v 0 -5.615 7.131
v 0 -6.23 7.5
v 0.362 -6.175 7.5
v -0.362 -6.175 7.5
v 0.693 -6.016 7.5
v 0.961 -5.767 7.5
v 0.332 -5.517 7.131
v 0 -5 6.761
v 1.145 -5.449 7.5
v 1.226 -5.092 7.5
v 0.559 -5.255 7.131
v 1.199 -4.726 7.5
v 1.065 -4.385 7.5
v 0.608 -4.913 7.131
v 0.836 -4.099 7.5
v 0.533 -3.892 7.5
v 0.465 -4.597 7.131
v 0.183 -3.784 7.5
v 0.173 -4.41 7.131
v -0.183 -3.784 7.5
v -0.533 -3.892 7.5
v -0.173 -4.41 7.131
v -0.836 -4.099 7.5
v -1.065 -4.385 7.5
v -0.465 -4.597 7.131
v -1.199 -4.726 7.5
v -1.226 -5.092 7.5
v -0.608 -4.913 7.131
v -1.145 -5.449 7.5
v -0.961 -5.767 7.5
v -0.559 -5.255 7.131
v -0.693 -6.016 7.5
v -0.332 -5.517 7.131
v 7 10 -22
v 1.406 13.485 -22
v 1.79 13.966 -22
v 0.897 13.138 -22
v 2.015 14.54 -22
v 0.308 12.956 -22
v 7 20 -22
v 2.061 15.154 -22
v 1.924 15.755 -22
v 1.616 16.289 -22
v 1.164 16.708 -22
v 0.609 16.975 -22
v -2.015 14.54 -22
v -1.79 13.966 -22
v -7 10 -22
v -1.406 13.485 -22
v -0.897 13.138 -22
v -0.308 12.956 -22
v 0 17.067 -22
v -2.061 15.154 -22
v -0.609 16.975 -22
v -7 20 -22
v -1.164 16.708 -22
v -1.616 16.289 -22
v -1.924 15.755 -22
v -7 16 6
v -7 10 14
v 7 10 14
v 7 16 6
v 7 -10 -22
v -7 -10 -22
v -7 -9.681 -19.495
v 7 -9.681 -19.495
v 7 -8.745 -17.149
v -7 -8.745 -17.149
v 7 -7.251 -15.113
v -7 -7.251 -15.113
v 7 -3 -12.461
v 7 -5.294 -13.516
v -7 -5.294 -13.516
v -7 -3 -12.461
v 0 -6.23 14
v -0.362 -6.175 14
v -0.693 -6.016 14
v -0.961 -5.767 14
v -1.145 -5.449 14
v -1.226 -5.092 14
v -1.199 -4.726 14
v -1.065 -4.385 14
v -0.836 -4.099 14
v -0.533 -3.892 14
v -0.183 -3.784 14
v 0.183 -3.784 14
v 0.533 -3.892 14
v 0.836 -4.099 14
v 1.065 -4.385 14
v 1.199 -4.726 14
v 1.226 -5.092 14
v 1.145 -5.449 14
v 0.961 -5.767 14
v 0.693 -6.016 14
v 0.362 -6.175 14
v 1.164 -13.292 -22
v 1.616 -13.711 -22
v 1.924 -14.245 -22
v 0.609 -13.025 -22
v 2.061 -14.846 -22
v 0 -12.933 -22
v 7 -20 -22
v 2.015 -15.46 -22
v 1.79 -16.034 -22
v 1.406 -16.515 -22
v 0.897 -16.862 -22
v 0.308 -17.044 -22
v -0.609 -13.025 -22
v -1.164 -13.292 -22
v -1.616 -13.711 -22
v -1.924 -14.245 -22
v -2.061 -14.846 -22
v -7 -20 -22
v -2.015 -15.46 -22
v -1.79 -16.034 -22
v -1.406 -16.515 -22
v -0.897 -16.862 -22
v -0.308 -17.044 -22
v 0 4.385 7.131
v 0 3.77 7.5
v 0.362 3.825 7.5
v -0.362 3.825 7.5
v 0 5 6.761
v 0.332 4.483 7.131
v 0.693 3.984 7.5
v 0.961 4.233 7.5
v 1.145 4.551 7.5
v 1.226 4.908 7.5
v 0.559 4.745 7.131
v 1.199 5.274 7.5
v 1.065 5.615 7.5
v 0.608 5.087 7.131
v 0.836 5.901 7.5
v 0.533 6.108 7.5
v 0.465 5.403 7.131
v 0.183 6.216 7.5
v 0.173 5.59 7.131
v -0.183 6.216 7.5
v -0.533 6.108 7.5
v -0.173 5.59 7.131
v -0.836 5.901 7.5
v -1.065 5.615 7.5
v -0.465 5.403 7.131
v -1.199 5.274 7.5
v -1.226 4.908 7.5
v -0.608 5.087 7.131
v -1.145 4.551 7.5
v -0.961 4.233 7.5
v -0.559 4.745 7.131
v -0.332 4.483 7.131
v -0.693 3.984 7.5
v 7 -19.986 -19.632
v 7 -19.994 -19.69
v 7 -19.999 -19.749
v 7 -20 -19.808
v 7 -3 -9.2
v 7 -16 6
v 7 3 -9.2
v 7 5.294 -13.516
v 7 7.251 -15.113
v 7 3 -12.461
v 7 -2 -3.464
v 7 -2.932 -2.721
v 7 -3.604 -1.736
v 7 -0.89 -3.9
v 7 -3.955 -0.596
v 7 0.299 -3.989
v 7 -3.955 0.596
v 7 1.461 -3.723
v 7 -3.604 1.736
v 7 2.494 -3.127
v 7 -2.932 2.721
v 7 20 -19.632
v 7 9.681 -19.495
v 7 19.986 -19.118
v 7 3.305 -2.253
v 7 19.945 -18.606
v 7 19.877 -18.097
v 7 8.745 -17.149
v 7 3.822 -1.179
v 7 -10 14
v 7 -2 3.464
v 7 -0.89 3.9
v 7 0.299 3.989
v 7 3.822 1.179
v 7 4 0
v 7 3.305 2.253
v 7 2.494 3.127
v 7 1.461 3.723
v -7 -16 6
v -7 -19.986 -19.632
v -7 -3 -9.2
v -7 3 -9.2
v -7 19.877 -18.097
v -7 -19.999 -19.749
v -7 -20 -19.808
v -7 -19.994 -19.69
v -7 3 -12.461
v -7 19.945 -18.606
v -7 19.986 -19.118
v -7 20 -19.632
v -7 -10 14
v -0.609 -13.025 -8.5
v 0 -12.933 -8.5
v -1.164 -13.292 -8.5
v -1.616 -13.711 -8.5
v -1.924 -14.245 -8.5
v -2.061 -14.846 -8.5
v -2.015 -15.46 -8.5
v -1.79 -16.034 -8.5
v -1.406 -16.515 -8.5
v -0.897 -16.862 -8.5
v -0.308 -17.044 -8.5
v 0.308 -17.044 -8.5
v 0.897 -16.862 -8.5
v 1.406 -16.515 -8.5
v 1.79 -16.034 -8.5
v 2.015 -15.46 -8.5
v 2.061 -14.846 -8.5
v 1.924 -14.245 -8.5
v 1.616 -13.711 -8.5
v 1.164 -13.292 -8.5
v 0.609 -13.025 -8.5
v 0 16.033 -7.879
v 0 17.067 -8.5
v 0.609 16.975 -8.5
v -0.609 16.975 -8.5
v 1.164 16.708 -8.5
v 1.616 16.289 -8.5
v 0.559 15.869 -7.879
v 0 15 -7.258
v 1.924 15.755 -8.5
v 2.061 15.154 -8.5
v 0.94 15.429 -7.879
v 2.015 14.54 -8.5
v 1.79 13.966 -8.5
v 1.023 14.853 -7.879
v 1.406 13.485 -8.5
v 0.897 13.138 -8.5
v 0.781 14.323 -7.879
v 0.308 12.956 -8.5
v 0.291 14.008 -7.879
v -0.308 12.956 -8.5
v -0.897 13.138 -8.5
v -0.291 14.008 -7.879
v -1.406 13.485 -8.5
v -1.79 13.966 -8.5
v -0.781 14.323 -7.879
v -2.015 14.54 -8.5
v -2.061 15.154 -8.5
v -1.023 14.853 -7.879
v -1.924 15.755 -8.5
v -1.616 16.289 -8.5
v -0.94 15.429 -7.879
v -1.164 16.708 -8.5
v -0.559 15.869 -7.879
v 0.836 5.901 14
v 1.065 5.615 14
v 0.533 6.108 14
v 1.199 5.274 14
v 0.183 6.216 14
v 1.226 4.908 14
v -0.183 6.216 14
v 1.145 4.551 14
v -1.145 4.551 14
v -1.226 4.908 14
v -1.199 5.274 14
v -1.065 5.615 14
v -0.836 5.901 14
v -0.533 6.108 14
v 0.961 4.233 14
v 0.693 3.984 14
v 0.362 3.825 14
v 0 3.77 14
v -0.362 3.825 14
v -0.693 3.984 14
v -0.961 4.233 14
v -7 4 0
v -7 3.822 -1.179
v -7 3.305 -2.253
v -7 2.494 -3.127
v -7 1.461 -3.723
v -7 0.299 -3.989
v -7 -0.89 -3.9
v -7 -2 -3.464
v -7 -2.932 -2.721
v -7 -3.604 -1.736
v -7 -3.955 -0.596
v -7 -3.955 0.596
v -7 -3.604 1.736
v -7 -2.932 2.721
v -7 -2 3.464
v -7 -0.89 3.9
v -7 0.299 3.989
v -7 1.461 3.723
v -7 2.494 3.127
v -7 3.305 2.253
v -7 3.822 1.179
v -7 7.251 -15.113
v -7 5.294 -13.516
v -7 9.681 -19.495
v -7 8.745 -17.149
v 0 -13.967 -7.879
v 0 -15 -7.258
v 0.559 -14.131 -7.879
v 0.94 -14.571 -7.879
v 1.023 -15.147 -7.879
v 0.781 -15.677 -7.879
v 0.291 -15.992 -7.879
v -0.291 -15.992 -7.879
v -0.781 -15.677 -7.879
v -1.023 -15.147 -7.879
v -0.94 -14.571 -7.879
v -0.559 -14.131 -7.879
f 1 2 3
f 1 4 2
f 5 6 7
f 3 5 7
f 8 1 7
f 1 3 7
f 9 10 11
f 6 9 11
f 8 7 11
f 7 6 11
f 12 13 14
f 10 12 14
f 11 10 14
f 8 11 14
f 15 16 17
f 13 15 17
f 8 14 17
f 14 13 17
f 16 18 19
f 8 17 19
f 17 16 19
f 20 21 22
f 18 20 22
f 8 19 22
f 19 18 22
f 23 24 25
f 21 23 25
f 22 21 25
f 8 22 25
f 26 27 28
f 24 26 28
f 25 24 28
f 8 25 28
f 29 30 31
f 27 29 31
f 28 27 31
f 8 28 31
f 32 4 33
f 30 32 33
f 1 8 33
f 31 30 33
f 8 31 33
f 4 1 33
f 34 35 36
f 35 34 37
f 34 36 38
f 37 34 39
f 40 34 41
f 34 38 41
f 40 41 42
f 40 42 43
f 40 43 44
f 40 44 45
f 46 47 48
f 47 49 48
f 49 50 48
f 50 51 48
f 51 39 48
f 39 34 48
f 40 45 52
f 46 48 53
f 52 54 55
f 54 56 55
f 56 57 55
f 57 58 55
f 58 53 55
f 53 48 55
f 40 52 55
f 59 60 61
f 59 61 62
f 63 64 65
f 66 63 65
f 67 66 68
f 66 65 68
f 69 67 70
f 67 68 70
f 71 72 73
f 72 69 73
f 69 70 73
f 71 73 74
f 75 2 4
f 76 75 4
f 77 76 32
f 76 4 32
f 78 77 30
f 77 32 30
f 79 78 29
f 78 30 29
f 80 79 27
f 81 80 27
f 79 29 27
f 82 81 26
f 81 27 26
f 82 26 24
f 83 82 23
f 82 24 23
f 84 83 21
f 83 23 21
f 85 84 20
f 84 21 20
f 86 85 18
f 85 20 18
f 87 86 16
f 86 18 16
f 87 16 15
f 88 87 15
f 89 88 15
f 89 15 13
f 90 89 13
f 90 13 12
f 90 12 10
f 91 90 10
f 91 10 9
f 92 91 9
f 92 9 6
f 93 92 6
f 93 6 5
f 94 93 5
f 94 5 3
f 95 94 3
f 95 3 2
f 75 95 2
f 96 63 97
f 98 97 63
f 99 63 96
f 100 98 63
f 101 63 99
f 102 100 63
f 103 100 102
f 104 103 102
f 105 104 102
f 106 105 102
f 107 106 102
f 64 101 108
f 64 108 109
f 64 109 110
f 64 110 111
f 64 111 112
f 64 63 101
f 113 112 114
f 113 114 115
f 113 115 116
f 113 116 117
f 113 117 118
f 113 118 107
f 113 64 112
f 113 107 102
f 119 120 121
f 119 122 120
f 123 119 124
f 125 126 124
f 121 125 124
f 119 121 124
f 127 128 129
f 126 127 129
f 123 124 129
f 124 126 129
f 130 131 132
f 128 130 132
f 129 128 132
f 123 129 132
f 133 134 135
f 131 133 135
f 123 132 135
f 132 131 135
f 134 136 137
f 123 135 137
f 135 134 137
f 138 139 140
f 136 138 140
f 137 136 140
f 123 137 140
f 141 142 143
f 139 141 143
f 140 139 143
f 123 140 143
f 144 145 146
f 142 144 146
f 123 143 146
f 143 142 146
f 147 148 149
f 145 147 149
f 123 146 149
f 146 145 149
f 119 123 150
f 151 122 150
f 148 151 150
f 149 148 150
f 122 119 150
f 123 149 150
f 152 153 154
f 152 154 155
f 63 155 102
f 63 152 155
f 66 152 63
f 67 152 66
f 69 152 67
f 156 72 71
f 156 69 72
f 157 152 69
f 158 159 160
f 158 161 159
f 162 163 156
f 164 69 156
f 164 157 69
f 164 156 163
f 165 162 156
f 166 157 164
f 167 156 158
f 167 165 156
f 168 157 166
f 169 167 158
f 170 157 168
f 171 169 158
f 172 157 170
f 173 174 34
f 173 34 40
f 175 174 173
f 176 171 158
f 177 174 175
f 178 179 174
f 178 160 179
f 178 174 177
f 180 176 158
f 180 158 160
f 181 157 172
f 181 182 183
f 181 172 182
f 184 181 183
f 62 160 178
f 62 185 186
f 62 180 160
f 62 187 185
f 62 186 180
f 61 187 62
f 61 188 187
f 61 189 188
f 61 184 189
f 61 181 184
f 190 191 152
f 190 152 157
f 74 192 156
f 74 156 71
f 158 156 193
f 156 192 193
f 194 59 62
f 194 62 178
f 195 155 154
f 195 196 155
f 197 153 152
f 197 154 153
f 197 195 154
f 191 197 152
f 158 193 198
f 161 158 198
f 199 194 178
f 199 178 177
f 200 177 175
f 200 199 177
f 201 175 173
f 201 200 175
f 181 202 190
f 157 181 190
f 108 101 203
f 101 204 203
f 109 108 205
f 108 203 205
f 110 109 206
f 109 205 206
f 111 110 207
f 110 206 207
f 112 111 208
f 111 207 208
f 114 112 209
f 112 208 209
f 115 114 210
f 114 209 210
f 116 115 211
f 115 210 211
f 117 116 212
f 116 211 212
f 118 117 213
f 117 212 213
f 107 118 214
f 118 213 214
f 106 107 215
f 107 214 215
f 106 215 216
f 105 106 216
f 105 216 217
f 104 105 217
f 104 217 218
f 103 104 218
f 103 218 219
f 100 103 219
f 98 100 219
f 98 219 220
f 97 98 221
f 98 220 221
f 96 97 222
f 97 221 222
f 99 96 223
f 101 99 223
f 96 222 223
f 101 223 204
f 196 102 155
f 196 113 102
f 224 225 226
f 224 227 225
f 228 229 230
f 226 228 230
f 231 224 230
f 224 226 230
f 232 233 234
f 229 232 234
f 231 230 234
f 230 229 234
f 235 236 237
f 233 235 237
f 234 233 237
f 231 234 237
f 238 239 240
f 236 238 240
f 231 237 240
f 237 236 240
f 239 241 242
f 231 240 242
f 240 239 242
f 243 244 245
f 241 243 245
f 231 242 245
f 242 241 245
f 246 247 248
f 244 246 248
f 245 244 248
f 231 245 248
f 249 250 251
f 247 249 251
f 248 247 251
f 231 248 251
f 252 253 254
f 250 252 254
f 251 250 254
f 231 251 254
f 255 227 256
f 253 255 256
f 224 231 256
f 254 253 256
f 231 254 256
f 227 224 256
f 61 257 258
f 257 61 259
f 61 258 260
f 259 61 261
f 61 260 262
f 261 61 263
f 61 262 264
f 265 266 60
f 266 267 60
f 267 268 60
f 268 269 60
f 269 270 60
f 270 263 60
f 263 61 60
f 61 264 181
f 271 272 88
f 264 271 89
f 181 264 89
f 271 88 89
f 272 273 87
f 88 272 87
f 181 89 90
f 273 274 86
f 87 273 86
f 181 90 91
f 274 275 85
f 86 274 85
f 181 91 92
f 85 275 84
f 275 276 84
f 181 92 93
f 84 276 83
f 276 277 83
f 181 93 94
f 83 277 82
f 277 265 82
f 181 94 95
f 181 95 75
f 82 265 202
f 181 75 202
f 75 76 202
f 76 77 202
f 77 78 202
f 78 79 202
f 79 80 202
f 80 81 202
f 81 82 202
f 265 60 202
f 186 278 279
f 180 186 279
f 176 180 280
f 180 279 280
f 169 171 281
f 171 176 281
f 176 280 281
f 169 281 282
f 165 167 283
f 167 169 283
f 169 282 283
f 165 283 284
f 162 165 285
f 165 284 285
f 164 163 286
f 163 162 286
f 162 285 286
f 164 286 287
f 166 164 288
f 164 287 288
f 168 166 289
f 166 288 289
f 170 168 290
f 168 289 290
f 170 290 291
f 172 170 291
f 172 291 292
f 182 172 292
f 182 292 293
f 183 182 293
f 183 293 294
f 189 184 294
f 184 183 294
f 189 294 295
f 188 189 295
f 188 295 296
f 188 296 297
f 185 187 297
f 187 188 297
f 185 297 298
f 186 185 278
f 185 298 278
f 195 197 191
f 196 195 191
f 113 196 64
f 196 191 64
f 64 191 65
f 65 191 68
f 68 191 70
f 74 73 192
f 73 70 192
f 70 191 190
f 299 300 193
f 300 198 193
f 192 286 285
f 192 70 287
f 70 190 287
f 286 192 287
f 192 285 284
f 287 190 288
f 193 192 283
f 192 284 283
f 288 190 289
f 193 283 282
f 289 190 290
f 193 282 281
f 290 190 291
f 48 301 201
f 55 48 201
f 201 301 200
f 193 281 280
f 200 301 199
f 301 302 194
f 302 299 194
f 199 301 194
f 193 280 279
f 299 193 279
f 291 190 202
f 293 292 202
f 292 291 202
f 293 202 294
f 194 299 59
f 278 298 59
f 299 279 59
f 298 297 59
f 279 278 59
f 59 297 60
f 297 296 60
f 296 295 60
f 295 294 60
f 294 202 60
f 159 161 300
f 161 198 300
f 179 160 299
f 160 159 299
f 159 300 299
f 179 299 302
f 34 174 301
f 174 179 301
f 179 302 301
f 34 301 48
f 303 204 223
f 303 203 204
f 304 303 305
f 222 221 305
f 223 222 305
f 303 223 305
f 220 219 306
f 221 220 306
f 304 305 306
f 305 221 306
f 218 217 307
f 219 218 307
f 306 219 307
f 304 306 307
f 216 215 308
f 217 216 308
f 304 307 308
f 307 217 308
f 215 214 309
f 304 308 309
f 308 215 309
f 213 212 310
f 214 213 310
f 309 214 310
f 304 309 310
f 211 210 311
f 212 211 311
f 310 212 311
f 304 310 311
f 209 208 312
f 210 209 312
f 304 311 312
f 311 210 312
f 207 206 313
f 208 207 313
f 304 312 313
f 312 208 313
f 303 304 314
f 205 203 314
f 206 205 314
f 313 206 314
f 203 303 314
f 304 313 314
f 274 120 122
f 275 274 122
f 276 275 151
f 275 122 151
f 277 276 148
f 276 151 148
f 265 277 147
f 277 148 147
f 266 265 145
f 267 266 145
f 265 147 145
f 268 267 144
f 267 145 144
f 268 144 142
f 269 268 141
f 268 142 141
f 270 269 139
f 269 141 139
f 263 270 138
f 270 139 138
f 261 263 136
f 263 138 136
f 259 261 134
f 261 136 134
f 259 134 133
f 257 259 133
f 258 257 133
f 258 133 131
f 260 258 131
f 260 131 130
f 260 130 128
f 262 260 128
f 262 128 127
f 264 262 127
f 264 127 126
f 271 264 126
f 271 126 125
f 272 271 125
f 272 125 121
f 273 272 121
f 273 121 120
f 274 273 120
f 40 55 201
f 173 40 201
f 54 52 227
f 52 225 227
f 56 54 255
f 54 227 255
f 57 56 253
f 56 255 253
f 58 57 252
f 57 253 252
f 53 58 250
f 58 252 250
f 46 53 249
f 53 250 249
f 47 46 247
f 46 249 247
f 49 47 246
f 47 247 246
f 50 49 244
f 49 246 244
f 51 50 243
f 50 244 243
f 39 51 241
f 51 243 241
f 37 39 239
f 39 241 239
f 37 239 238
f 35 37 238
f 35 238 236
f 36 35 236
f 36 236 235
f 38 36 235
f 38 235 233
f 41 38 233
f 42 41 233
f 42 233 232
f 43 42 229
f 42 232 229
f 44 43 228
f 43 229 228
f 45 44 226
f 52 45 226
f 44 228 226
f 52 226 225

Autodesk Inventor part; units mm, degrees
ref_plane "YZ Plane" through (0, 0, 0) normal (1, 0, 0) x (0, 1, 0)
sketch "Sketch1" plane through (0, 0, 0) normal (1, 0, 0) x (0, 1, 0)
  circle A0 centre (0, 0) radius 4
  line L0 (0, 0) -> (0, -22) construction
  line L1 (-10, -22) -> (-20, -22)
  line L2 (-20, -22) -> (-20, -19.8078)
  line L3 (10, -22) -> (20, -22)
  line L4 (20, -22) -> (20, -19.6315)
  line L5 (0, -9.2) -> (3, -9.2)
  line L6 (3, -9.2) -> (3, -12.4606)
  line L7 (0, -9.2) -> (-3, -9.2)
  line L8 (-3, -9.2) -> (-3, -12.4606)
  arc A1 (10, -22) -> (3, -12.4606) centre (0, -22) ccw
  arc A2 (-3, -12.4606) -> (-10, -22) centre (0, -22) ccw
  arc A3 (-19.9864, -19.6315) -> (-20, -19.8078) centre (-18.8527, -19.8078) ccw
  arc A4 (20, -19.6315) -> (19.8774, -18.0974) centre (10.3433, -19.6315) ccw
  line L9 (-19.9864, -19.6315) -> (-16, 6)
  line L10 (16, 6) -> (19.8774, -18.0974)
  line L11 (0, 14) -> (-10, 14)
  line L12 (-10, 14) -> (-16, 6)
  line L13 (0, 14) -> (10, 14)
  line L14 (10, 14) -> (16, 6)
  point P0 (-20, -12)
  point P1 (20, -12)
  dimension "d0" = 8
  dimension "d2" = 22
  dimension "d4" = 20
  dimension "d5" = 10
  dimension "d13" = 12.8
  dimension "d26" = 10
  dimension "d73" = 10
  dimension "d74" = 8
  dimension "d76" = 10
  dimension "d107" = 6
  dimension "d119" = 6
  dimension "d122" = 14
extrude "Extrusion1" add sketch "Sketch1" along normal mid plane 14
sketch "Sketch2" plane through (7, -10, -22) normal (0, 0, -1) x (-1, 0, 0)
  line L0 (14, 0) -> (14, -10) projected
  line L1 (7, 10) -> (-4.9056, 10) construction
  line L2 (14, 20) -> (0, 20)
  line L3 (0, 30) -> (0, 20)
  line L4 (0, 30) -> (14, 30)
  line L5 (14, 20) -> (14, 30)
  line L6 (0, -10) -> (0, 0) projected
  line L7 (14, 0) -> (0, 0) projected
  line L8 (0, -10) -> (14, -10) projected
  point P0 (5, 26.5)
  point P1 (5, -6.5)
  dimension "d46" = 5
  dimension "d48" = 3.5
  dimension "d50" = 5
  dimension "d51" = 3.5
ref_plane "Work Plane1" through (16, 0, 0) normal (1, 0, 0) x (0, 0, -1)
sketch "Sketch7" plane through (-7, 0, 0) normal (-1, 0, 0) x (0, 0, 1)
  circle A0 centre (0, 0) radius 4 projected
  circle A1 centre (0, 0) radius 14.25
  dimension "d52" = 28.5
sketch "Sketch10" plane through (-7, -10, 14) normal (0, 0, 1) x (1, 0, 0)
  line L0 (0, 0) -> (14, 0) projected
  line L1 (14, 20) -> (14, 0) projected
  line L2 (0, 20) -> (14, 20) projected
  line L3 (0, 0) -> (0, 20) projected
  point P0 (7, 10)
sketch "Sketch15" plane through (7, -10, -22) normal (0, 0, -1) x (-1, 0, 0)
  line L0 (14, 0) -> (0, 0) projected
  line L1 (0, -10) -> (0, 0) projected
  line L2 (0, -10) -> (14, -10) projected
  line L3 (14, 0) -> (14, -10) projected
  point P0 (7, 10)
sketch "Sketch16" plane through (7, -10, -22) normal (0, 0, -1) x (-1, 0, 0)
  line L0 (0, -10) -> (14, -10) projected
  line L1 (14, 0) -> (14, -10) projected
  line L2 (7, -10) -> (7, 30.0311)
  line L3 (4.3309, -5) -> (12.7149, -5)
  line L4 (3.2036, 25) -> (11.1649, 25)
  line L5 (14, 30) -> (0, 30) projected
  line L6 (0, 20) -> (0, 30) projected
  line L7 (14, 20) -> (0, 20) projected
  line L8 (14, 30) -> (14, 20) projected
  point P0 (7, 10)
  point P1 (7, 25)
  point P2 (7, -5)
  dimension "d110" = 5
  dimension "d111" = 5
hole "Hole13" at (0, -15, -22) at (0, 15, -22) direction (0, 0, 1) diameter 4.134 depth 13.5 tip angle 118 thread size "M5x0.8" class "6H" standard "ANSI Metric M Profile"
ref_plane "Work Plane2" through (19.5, 0, 0) normal (1, 0, 0) x (0, 0, -1)
sketch "Sketch17" plane through (19.5, 0, 0) normal (1, 0, 0) x (0, 0, -1)
  point P0 (0, 0)
  point P1 (0, 0)
sketch "Sketch18" plane through (-7, -10, 14) normal (0, 0, 1) x (1, 0, 0)
  circle A0 centre (7, 15) radius 1.5
  line L0 (0, 0) -> (14, 0) projected
  line L1 (14, 20) -> (14, 0) projected
  line L2 (0, 20) -> (14, 20) projected
  line L3 (0, 0) -> (0, 20) projected
  circle A1 centre (7, 5) radius 1.5
  point P0 (7, 10)
  dimension "d132" = 7
hole "Hole14" at (0, 5, 14) at (0, -5, 14) direction (0, 0, -1) diameter 2.459 depth 6.5 tip angle 118 thread size "M3x0.5" class "6H" standard "ANSI Metric M Profile"
equation "\"d46\" = d50"
equation "\"d51\" = d48"
properties part number "2DOF-150-18-LEVS-01" material "Stainless Steel"
